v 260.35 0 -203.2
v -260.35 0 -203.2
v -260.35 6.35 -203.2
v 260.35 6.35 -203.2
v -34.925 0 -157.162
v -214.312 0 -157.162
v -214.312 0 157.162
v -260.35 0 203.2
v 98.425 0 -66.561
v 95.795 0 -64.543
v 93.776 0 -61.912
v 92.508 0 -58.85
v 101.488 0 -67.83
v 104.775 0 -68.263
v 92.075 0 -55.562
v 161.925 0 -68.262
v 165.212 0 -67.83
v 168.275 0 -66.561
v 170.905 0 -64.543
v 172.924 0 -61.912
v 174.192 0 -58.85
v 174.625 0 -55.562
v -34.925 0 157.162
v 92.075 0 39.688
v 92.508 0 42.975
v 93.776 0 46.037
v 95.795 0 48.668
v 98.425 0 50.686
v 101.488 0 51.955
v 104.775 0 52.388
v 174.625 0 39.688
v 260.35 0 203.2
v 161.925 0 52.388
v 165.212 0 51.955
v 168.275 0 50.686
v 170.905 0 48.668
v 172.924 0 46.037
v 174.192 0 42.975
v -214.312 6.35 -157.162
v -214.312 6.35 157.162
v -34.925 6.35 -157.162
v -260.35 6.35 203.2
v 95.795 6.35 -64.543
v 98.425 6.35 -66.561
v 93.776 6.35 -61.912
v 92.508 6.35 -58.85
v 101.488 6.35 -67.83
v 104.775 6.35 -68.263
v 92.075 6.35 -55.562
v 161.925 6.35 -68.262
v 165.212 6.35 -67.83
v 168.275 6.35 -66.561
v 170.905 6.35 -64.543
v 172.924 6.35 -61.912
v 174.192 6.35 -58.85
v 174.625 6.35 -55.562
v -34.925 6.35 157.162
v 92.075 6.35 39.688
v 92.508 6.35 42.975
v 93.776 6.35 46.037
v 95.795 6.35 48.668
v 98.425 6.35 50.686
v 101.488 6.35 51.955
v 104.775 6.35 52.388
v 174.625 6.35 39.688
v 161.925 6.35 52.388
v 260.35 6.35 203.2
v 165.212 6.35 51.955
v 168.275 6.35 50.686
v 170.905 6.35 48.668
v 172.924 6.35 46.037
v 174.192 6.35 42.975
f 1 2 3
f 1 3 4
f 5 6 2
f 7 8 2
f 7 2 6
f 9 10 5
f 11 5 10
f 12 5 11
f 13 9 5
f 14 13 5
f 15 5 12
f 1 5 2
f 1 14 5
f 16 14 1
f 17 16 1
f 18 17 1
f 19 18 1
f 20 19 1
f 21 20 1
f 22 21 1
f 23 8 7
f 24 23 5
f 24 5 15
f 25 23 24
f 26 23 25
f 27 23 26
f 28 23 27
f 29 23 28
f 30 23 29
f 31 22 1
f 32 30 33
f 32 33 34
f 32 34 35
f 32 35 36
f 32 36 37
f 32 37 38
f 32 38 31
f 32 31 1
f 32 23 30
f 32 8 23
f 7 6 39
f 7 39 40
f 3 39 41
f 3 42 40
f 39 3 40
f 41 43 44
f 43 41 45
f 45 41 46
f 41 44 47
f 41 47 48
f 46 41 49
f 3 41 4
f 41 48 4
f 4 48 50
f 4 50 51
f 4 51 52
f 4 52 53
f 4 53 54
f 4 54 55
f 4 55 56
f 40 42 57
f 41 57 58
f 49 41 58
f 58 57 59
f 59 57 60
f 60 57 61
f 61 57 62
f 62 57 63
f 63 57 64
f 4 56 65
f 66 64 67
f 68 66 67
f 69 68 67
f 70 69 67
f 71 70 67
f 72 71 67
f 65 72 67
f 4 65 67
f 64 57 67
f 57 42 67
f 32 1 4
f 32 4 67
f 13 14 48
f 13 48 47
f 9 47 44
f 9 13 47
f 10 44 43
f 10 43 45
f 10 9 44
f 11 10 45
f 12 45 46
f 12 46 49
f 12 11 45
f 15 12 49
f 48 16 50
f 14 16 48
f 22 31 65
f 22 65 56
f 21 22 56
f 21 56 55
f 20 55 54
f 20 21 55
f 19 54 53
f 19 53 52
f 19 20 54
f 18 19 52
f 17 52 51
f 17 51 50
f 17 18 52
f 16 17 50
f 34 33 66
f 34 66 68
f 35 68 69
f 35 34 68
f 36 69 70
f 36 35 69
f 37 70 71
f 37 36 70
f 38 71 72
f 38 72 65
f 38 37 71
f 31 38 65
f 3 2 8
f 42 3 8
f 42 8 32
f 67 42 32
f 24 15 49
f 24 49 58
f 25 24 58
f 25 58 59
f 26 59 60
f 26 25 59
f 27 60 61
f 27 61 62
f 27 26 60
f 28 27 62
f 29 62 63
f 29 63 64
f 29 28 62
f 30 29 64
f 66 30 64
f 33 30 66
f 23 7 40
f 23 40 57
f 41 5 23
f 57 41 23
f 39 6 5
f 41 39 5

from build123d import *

# Parameters (mm, degrees)
F0_W     = 520.7
F0_H     = 406.4
F0_W_2   = 179.3875
F0_H_2   = 314.325
F1_DEPTH = 6.35


with BuildPart() as f1:
    # F0 (on Front) → F1 (new body)
    with BuildSketch(Plane.XZ):
        Rectangle(F0_W, F0_H)
        with Locations((-124.61875, 0)):
            Rectangle(F0_W_2, F0_H_2, mode=Mode.SUBTRACT)
        with BuildLine():
            ThreePointArc((92.075, 39.6875), (95.794744, 48.667756), (104.775, 52.3875))
            Line((104.775, 52.3875), (161.925, 52.3875))
            ThreePointArc((161.925, 52.3875), (170.905256, 48.667756), (174.625, 39.6875))
            Line((174.625, 39.6875), (174.625, -55.5625))
            ThreePointArc((174.625, -55.5625), (170.905256, -64.542756), (161.925, -68.2625))
            Line((161.925, -68.2625), (104.775, -68.2625))
            ThreePointArc((104.775, -68.2625), (95.794744, -64.542756), (92.075, -55.5625))
            Line((92.075, -55.5625), (92.075, 39.6875))
        make_face(mode=Mode.SUBTRACT)
    extrude(amount=-F1_DEPTH)


solid = f1.part
